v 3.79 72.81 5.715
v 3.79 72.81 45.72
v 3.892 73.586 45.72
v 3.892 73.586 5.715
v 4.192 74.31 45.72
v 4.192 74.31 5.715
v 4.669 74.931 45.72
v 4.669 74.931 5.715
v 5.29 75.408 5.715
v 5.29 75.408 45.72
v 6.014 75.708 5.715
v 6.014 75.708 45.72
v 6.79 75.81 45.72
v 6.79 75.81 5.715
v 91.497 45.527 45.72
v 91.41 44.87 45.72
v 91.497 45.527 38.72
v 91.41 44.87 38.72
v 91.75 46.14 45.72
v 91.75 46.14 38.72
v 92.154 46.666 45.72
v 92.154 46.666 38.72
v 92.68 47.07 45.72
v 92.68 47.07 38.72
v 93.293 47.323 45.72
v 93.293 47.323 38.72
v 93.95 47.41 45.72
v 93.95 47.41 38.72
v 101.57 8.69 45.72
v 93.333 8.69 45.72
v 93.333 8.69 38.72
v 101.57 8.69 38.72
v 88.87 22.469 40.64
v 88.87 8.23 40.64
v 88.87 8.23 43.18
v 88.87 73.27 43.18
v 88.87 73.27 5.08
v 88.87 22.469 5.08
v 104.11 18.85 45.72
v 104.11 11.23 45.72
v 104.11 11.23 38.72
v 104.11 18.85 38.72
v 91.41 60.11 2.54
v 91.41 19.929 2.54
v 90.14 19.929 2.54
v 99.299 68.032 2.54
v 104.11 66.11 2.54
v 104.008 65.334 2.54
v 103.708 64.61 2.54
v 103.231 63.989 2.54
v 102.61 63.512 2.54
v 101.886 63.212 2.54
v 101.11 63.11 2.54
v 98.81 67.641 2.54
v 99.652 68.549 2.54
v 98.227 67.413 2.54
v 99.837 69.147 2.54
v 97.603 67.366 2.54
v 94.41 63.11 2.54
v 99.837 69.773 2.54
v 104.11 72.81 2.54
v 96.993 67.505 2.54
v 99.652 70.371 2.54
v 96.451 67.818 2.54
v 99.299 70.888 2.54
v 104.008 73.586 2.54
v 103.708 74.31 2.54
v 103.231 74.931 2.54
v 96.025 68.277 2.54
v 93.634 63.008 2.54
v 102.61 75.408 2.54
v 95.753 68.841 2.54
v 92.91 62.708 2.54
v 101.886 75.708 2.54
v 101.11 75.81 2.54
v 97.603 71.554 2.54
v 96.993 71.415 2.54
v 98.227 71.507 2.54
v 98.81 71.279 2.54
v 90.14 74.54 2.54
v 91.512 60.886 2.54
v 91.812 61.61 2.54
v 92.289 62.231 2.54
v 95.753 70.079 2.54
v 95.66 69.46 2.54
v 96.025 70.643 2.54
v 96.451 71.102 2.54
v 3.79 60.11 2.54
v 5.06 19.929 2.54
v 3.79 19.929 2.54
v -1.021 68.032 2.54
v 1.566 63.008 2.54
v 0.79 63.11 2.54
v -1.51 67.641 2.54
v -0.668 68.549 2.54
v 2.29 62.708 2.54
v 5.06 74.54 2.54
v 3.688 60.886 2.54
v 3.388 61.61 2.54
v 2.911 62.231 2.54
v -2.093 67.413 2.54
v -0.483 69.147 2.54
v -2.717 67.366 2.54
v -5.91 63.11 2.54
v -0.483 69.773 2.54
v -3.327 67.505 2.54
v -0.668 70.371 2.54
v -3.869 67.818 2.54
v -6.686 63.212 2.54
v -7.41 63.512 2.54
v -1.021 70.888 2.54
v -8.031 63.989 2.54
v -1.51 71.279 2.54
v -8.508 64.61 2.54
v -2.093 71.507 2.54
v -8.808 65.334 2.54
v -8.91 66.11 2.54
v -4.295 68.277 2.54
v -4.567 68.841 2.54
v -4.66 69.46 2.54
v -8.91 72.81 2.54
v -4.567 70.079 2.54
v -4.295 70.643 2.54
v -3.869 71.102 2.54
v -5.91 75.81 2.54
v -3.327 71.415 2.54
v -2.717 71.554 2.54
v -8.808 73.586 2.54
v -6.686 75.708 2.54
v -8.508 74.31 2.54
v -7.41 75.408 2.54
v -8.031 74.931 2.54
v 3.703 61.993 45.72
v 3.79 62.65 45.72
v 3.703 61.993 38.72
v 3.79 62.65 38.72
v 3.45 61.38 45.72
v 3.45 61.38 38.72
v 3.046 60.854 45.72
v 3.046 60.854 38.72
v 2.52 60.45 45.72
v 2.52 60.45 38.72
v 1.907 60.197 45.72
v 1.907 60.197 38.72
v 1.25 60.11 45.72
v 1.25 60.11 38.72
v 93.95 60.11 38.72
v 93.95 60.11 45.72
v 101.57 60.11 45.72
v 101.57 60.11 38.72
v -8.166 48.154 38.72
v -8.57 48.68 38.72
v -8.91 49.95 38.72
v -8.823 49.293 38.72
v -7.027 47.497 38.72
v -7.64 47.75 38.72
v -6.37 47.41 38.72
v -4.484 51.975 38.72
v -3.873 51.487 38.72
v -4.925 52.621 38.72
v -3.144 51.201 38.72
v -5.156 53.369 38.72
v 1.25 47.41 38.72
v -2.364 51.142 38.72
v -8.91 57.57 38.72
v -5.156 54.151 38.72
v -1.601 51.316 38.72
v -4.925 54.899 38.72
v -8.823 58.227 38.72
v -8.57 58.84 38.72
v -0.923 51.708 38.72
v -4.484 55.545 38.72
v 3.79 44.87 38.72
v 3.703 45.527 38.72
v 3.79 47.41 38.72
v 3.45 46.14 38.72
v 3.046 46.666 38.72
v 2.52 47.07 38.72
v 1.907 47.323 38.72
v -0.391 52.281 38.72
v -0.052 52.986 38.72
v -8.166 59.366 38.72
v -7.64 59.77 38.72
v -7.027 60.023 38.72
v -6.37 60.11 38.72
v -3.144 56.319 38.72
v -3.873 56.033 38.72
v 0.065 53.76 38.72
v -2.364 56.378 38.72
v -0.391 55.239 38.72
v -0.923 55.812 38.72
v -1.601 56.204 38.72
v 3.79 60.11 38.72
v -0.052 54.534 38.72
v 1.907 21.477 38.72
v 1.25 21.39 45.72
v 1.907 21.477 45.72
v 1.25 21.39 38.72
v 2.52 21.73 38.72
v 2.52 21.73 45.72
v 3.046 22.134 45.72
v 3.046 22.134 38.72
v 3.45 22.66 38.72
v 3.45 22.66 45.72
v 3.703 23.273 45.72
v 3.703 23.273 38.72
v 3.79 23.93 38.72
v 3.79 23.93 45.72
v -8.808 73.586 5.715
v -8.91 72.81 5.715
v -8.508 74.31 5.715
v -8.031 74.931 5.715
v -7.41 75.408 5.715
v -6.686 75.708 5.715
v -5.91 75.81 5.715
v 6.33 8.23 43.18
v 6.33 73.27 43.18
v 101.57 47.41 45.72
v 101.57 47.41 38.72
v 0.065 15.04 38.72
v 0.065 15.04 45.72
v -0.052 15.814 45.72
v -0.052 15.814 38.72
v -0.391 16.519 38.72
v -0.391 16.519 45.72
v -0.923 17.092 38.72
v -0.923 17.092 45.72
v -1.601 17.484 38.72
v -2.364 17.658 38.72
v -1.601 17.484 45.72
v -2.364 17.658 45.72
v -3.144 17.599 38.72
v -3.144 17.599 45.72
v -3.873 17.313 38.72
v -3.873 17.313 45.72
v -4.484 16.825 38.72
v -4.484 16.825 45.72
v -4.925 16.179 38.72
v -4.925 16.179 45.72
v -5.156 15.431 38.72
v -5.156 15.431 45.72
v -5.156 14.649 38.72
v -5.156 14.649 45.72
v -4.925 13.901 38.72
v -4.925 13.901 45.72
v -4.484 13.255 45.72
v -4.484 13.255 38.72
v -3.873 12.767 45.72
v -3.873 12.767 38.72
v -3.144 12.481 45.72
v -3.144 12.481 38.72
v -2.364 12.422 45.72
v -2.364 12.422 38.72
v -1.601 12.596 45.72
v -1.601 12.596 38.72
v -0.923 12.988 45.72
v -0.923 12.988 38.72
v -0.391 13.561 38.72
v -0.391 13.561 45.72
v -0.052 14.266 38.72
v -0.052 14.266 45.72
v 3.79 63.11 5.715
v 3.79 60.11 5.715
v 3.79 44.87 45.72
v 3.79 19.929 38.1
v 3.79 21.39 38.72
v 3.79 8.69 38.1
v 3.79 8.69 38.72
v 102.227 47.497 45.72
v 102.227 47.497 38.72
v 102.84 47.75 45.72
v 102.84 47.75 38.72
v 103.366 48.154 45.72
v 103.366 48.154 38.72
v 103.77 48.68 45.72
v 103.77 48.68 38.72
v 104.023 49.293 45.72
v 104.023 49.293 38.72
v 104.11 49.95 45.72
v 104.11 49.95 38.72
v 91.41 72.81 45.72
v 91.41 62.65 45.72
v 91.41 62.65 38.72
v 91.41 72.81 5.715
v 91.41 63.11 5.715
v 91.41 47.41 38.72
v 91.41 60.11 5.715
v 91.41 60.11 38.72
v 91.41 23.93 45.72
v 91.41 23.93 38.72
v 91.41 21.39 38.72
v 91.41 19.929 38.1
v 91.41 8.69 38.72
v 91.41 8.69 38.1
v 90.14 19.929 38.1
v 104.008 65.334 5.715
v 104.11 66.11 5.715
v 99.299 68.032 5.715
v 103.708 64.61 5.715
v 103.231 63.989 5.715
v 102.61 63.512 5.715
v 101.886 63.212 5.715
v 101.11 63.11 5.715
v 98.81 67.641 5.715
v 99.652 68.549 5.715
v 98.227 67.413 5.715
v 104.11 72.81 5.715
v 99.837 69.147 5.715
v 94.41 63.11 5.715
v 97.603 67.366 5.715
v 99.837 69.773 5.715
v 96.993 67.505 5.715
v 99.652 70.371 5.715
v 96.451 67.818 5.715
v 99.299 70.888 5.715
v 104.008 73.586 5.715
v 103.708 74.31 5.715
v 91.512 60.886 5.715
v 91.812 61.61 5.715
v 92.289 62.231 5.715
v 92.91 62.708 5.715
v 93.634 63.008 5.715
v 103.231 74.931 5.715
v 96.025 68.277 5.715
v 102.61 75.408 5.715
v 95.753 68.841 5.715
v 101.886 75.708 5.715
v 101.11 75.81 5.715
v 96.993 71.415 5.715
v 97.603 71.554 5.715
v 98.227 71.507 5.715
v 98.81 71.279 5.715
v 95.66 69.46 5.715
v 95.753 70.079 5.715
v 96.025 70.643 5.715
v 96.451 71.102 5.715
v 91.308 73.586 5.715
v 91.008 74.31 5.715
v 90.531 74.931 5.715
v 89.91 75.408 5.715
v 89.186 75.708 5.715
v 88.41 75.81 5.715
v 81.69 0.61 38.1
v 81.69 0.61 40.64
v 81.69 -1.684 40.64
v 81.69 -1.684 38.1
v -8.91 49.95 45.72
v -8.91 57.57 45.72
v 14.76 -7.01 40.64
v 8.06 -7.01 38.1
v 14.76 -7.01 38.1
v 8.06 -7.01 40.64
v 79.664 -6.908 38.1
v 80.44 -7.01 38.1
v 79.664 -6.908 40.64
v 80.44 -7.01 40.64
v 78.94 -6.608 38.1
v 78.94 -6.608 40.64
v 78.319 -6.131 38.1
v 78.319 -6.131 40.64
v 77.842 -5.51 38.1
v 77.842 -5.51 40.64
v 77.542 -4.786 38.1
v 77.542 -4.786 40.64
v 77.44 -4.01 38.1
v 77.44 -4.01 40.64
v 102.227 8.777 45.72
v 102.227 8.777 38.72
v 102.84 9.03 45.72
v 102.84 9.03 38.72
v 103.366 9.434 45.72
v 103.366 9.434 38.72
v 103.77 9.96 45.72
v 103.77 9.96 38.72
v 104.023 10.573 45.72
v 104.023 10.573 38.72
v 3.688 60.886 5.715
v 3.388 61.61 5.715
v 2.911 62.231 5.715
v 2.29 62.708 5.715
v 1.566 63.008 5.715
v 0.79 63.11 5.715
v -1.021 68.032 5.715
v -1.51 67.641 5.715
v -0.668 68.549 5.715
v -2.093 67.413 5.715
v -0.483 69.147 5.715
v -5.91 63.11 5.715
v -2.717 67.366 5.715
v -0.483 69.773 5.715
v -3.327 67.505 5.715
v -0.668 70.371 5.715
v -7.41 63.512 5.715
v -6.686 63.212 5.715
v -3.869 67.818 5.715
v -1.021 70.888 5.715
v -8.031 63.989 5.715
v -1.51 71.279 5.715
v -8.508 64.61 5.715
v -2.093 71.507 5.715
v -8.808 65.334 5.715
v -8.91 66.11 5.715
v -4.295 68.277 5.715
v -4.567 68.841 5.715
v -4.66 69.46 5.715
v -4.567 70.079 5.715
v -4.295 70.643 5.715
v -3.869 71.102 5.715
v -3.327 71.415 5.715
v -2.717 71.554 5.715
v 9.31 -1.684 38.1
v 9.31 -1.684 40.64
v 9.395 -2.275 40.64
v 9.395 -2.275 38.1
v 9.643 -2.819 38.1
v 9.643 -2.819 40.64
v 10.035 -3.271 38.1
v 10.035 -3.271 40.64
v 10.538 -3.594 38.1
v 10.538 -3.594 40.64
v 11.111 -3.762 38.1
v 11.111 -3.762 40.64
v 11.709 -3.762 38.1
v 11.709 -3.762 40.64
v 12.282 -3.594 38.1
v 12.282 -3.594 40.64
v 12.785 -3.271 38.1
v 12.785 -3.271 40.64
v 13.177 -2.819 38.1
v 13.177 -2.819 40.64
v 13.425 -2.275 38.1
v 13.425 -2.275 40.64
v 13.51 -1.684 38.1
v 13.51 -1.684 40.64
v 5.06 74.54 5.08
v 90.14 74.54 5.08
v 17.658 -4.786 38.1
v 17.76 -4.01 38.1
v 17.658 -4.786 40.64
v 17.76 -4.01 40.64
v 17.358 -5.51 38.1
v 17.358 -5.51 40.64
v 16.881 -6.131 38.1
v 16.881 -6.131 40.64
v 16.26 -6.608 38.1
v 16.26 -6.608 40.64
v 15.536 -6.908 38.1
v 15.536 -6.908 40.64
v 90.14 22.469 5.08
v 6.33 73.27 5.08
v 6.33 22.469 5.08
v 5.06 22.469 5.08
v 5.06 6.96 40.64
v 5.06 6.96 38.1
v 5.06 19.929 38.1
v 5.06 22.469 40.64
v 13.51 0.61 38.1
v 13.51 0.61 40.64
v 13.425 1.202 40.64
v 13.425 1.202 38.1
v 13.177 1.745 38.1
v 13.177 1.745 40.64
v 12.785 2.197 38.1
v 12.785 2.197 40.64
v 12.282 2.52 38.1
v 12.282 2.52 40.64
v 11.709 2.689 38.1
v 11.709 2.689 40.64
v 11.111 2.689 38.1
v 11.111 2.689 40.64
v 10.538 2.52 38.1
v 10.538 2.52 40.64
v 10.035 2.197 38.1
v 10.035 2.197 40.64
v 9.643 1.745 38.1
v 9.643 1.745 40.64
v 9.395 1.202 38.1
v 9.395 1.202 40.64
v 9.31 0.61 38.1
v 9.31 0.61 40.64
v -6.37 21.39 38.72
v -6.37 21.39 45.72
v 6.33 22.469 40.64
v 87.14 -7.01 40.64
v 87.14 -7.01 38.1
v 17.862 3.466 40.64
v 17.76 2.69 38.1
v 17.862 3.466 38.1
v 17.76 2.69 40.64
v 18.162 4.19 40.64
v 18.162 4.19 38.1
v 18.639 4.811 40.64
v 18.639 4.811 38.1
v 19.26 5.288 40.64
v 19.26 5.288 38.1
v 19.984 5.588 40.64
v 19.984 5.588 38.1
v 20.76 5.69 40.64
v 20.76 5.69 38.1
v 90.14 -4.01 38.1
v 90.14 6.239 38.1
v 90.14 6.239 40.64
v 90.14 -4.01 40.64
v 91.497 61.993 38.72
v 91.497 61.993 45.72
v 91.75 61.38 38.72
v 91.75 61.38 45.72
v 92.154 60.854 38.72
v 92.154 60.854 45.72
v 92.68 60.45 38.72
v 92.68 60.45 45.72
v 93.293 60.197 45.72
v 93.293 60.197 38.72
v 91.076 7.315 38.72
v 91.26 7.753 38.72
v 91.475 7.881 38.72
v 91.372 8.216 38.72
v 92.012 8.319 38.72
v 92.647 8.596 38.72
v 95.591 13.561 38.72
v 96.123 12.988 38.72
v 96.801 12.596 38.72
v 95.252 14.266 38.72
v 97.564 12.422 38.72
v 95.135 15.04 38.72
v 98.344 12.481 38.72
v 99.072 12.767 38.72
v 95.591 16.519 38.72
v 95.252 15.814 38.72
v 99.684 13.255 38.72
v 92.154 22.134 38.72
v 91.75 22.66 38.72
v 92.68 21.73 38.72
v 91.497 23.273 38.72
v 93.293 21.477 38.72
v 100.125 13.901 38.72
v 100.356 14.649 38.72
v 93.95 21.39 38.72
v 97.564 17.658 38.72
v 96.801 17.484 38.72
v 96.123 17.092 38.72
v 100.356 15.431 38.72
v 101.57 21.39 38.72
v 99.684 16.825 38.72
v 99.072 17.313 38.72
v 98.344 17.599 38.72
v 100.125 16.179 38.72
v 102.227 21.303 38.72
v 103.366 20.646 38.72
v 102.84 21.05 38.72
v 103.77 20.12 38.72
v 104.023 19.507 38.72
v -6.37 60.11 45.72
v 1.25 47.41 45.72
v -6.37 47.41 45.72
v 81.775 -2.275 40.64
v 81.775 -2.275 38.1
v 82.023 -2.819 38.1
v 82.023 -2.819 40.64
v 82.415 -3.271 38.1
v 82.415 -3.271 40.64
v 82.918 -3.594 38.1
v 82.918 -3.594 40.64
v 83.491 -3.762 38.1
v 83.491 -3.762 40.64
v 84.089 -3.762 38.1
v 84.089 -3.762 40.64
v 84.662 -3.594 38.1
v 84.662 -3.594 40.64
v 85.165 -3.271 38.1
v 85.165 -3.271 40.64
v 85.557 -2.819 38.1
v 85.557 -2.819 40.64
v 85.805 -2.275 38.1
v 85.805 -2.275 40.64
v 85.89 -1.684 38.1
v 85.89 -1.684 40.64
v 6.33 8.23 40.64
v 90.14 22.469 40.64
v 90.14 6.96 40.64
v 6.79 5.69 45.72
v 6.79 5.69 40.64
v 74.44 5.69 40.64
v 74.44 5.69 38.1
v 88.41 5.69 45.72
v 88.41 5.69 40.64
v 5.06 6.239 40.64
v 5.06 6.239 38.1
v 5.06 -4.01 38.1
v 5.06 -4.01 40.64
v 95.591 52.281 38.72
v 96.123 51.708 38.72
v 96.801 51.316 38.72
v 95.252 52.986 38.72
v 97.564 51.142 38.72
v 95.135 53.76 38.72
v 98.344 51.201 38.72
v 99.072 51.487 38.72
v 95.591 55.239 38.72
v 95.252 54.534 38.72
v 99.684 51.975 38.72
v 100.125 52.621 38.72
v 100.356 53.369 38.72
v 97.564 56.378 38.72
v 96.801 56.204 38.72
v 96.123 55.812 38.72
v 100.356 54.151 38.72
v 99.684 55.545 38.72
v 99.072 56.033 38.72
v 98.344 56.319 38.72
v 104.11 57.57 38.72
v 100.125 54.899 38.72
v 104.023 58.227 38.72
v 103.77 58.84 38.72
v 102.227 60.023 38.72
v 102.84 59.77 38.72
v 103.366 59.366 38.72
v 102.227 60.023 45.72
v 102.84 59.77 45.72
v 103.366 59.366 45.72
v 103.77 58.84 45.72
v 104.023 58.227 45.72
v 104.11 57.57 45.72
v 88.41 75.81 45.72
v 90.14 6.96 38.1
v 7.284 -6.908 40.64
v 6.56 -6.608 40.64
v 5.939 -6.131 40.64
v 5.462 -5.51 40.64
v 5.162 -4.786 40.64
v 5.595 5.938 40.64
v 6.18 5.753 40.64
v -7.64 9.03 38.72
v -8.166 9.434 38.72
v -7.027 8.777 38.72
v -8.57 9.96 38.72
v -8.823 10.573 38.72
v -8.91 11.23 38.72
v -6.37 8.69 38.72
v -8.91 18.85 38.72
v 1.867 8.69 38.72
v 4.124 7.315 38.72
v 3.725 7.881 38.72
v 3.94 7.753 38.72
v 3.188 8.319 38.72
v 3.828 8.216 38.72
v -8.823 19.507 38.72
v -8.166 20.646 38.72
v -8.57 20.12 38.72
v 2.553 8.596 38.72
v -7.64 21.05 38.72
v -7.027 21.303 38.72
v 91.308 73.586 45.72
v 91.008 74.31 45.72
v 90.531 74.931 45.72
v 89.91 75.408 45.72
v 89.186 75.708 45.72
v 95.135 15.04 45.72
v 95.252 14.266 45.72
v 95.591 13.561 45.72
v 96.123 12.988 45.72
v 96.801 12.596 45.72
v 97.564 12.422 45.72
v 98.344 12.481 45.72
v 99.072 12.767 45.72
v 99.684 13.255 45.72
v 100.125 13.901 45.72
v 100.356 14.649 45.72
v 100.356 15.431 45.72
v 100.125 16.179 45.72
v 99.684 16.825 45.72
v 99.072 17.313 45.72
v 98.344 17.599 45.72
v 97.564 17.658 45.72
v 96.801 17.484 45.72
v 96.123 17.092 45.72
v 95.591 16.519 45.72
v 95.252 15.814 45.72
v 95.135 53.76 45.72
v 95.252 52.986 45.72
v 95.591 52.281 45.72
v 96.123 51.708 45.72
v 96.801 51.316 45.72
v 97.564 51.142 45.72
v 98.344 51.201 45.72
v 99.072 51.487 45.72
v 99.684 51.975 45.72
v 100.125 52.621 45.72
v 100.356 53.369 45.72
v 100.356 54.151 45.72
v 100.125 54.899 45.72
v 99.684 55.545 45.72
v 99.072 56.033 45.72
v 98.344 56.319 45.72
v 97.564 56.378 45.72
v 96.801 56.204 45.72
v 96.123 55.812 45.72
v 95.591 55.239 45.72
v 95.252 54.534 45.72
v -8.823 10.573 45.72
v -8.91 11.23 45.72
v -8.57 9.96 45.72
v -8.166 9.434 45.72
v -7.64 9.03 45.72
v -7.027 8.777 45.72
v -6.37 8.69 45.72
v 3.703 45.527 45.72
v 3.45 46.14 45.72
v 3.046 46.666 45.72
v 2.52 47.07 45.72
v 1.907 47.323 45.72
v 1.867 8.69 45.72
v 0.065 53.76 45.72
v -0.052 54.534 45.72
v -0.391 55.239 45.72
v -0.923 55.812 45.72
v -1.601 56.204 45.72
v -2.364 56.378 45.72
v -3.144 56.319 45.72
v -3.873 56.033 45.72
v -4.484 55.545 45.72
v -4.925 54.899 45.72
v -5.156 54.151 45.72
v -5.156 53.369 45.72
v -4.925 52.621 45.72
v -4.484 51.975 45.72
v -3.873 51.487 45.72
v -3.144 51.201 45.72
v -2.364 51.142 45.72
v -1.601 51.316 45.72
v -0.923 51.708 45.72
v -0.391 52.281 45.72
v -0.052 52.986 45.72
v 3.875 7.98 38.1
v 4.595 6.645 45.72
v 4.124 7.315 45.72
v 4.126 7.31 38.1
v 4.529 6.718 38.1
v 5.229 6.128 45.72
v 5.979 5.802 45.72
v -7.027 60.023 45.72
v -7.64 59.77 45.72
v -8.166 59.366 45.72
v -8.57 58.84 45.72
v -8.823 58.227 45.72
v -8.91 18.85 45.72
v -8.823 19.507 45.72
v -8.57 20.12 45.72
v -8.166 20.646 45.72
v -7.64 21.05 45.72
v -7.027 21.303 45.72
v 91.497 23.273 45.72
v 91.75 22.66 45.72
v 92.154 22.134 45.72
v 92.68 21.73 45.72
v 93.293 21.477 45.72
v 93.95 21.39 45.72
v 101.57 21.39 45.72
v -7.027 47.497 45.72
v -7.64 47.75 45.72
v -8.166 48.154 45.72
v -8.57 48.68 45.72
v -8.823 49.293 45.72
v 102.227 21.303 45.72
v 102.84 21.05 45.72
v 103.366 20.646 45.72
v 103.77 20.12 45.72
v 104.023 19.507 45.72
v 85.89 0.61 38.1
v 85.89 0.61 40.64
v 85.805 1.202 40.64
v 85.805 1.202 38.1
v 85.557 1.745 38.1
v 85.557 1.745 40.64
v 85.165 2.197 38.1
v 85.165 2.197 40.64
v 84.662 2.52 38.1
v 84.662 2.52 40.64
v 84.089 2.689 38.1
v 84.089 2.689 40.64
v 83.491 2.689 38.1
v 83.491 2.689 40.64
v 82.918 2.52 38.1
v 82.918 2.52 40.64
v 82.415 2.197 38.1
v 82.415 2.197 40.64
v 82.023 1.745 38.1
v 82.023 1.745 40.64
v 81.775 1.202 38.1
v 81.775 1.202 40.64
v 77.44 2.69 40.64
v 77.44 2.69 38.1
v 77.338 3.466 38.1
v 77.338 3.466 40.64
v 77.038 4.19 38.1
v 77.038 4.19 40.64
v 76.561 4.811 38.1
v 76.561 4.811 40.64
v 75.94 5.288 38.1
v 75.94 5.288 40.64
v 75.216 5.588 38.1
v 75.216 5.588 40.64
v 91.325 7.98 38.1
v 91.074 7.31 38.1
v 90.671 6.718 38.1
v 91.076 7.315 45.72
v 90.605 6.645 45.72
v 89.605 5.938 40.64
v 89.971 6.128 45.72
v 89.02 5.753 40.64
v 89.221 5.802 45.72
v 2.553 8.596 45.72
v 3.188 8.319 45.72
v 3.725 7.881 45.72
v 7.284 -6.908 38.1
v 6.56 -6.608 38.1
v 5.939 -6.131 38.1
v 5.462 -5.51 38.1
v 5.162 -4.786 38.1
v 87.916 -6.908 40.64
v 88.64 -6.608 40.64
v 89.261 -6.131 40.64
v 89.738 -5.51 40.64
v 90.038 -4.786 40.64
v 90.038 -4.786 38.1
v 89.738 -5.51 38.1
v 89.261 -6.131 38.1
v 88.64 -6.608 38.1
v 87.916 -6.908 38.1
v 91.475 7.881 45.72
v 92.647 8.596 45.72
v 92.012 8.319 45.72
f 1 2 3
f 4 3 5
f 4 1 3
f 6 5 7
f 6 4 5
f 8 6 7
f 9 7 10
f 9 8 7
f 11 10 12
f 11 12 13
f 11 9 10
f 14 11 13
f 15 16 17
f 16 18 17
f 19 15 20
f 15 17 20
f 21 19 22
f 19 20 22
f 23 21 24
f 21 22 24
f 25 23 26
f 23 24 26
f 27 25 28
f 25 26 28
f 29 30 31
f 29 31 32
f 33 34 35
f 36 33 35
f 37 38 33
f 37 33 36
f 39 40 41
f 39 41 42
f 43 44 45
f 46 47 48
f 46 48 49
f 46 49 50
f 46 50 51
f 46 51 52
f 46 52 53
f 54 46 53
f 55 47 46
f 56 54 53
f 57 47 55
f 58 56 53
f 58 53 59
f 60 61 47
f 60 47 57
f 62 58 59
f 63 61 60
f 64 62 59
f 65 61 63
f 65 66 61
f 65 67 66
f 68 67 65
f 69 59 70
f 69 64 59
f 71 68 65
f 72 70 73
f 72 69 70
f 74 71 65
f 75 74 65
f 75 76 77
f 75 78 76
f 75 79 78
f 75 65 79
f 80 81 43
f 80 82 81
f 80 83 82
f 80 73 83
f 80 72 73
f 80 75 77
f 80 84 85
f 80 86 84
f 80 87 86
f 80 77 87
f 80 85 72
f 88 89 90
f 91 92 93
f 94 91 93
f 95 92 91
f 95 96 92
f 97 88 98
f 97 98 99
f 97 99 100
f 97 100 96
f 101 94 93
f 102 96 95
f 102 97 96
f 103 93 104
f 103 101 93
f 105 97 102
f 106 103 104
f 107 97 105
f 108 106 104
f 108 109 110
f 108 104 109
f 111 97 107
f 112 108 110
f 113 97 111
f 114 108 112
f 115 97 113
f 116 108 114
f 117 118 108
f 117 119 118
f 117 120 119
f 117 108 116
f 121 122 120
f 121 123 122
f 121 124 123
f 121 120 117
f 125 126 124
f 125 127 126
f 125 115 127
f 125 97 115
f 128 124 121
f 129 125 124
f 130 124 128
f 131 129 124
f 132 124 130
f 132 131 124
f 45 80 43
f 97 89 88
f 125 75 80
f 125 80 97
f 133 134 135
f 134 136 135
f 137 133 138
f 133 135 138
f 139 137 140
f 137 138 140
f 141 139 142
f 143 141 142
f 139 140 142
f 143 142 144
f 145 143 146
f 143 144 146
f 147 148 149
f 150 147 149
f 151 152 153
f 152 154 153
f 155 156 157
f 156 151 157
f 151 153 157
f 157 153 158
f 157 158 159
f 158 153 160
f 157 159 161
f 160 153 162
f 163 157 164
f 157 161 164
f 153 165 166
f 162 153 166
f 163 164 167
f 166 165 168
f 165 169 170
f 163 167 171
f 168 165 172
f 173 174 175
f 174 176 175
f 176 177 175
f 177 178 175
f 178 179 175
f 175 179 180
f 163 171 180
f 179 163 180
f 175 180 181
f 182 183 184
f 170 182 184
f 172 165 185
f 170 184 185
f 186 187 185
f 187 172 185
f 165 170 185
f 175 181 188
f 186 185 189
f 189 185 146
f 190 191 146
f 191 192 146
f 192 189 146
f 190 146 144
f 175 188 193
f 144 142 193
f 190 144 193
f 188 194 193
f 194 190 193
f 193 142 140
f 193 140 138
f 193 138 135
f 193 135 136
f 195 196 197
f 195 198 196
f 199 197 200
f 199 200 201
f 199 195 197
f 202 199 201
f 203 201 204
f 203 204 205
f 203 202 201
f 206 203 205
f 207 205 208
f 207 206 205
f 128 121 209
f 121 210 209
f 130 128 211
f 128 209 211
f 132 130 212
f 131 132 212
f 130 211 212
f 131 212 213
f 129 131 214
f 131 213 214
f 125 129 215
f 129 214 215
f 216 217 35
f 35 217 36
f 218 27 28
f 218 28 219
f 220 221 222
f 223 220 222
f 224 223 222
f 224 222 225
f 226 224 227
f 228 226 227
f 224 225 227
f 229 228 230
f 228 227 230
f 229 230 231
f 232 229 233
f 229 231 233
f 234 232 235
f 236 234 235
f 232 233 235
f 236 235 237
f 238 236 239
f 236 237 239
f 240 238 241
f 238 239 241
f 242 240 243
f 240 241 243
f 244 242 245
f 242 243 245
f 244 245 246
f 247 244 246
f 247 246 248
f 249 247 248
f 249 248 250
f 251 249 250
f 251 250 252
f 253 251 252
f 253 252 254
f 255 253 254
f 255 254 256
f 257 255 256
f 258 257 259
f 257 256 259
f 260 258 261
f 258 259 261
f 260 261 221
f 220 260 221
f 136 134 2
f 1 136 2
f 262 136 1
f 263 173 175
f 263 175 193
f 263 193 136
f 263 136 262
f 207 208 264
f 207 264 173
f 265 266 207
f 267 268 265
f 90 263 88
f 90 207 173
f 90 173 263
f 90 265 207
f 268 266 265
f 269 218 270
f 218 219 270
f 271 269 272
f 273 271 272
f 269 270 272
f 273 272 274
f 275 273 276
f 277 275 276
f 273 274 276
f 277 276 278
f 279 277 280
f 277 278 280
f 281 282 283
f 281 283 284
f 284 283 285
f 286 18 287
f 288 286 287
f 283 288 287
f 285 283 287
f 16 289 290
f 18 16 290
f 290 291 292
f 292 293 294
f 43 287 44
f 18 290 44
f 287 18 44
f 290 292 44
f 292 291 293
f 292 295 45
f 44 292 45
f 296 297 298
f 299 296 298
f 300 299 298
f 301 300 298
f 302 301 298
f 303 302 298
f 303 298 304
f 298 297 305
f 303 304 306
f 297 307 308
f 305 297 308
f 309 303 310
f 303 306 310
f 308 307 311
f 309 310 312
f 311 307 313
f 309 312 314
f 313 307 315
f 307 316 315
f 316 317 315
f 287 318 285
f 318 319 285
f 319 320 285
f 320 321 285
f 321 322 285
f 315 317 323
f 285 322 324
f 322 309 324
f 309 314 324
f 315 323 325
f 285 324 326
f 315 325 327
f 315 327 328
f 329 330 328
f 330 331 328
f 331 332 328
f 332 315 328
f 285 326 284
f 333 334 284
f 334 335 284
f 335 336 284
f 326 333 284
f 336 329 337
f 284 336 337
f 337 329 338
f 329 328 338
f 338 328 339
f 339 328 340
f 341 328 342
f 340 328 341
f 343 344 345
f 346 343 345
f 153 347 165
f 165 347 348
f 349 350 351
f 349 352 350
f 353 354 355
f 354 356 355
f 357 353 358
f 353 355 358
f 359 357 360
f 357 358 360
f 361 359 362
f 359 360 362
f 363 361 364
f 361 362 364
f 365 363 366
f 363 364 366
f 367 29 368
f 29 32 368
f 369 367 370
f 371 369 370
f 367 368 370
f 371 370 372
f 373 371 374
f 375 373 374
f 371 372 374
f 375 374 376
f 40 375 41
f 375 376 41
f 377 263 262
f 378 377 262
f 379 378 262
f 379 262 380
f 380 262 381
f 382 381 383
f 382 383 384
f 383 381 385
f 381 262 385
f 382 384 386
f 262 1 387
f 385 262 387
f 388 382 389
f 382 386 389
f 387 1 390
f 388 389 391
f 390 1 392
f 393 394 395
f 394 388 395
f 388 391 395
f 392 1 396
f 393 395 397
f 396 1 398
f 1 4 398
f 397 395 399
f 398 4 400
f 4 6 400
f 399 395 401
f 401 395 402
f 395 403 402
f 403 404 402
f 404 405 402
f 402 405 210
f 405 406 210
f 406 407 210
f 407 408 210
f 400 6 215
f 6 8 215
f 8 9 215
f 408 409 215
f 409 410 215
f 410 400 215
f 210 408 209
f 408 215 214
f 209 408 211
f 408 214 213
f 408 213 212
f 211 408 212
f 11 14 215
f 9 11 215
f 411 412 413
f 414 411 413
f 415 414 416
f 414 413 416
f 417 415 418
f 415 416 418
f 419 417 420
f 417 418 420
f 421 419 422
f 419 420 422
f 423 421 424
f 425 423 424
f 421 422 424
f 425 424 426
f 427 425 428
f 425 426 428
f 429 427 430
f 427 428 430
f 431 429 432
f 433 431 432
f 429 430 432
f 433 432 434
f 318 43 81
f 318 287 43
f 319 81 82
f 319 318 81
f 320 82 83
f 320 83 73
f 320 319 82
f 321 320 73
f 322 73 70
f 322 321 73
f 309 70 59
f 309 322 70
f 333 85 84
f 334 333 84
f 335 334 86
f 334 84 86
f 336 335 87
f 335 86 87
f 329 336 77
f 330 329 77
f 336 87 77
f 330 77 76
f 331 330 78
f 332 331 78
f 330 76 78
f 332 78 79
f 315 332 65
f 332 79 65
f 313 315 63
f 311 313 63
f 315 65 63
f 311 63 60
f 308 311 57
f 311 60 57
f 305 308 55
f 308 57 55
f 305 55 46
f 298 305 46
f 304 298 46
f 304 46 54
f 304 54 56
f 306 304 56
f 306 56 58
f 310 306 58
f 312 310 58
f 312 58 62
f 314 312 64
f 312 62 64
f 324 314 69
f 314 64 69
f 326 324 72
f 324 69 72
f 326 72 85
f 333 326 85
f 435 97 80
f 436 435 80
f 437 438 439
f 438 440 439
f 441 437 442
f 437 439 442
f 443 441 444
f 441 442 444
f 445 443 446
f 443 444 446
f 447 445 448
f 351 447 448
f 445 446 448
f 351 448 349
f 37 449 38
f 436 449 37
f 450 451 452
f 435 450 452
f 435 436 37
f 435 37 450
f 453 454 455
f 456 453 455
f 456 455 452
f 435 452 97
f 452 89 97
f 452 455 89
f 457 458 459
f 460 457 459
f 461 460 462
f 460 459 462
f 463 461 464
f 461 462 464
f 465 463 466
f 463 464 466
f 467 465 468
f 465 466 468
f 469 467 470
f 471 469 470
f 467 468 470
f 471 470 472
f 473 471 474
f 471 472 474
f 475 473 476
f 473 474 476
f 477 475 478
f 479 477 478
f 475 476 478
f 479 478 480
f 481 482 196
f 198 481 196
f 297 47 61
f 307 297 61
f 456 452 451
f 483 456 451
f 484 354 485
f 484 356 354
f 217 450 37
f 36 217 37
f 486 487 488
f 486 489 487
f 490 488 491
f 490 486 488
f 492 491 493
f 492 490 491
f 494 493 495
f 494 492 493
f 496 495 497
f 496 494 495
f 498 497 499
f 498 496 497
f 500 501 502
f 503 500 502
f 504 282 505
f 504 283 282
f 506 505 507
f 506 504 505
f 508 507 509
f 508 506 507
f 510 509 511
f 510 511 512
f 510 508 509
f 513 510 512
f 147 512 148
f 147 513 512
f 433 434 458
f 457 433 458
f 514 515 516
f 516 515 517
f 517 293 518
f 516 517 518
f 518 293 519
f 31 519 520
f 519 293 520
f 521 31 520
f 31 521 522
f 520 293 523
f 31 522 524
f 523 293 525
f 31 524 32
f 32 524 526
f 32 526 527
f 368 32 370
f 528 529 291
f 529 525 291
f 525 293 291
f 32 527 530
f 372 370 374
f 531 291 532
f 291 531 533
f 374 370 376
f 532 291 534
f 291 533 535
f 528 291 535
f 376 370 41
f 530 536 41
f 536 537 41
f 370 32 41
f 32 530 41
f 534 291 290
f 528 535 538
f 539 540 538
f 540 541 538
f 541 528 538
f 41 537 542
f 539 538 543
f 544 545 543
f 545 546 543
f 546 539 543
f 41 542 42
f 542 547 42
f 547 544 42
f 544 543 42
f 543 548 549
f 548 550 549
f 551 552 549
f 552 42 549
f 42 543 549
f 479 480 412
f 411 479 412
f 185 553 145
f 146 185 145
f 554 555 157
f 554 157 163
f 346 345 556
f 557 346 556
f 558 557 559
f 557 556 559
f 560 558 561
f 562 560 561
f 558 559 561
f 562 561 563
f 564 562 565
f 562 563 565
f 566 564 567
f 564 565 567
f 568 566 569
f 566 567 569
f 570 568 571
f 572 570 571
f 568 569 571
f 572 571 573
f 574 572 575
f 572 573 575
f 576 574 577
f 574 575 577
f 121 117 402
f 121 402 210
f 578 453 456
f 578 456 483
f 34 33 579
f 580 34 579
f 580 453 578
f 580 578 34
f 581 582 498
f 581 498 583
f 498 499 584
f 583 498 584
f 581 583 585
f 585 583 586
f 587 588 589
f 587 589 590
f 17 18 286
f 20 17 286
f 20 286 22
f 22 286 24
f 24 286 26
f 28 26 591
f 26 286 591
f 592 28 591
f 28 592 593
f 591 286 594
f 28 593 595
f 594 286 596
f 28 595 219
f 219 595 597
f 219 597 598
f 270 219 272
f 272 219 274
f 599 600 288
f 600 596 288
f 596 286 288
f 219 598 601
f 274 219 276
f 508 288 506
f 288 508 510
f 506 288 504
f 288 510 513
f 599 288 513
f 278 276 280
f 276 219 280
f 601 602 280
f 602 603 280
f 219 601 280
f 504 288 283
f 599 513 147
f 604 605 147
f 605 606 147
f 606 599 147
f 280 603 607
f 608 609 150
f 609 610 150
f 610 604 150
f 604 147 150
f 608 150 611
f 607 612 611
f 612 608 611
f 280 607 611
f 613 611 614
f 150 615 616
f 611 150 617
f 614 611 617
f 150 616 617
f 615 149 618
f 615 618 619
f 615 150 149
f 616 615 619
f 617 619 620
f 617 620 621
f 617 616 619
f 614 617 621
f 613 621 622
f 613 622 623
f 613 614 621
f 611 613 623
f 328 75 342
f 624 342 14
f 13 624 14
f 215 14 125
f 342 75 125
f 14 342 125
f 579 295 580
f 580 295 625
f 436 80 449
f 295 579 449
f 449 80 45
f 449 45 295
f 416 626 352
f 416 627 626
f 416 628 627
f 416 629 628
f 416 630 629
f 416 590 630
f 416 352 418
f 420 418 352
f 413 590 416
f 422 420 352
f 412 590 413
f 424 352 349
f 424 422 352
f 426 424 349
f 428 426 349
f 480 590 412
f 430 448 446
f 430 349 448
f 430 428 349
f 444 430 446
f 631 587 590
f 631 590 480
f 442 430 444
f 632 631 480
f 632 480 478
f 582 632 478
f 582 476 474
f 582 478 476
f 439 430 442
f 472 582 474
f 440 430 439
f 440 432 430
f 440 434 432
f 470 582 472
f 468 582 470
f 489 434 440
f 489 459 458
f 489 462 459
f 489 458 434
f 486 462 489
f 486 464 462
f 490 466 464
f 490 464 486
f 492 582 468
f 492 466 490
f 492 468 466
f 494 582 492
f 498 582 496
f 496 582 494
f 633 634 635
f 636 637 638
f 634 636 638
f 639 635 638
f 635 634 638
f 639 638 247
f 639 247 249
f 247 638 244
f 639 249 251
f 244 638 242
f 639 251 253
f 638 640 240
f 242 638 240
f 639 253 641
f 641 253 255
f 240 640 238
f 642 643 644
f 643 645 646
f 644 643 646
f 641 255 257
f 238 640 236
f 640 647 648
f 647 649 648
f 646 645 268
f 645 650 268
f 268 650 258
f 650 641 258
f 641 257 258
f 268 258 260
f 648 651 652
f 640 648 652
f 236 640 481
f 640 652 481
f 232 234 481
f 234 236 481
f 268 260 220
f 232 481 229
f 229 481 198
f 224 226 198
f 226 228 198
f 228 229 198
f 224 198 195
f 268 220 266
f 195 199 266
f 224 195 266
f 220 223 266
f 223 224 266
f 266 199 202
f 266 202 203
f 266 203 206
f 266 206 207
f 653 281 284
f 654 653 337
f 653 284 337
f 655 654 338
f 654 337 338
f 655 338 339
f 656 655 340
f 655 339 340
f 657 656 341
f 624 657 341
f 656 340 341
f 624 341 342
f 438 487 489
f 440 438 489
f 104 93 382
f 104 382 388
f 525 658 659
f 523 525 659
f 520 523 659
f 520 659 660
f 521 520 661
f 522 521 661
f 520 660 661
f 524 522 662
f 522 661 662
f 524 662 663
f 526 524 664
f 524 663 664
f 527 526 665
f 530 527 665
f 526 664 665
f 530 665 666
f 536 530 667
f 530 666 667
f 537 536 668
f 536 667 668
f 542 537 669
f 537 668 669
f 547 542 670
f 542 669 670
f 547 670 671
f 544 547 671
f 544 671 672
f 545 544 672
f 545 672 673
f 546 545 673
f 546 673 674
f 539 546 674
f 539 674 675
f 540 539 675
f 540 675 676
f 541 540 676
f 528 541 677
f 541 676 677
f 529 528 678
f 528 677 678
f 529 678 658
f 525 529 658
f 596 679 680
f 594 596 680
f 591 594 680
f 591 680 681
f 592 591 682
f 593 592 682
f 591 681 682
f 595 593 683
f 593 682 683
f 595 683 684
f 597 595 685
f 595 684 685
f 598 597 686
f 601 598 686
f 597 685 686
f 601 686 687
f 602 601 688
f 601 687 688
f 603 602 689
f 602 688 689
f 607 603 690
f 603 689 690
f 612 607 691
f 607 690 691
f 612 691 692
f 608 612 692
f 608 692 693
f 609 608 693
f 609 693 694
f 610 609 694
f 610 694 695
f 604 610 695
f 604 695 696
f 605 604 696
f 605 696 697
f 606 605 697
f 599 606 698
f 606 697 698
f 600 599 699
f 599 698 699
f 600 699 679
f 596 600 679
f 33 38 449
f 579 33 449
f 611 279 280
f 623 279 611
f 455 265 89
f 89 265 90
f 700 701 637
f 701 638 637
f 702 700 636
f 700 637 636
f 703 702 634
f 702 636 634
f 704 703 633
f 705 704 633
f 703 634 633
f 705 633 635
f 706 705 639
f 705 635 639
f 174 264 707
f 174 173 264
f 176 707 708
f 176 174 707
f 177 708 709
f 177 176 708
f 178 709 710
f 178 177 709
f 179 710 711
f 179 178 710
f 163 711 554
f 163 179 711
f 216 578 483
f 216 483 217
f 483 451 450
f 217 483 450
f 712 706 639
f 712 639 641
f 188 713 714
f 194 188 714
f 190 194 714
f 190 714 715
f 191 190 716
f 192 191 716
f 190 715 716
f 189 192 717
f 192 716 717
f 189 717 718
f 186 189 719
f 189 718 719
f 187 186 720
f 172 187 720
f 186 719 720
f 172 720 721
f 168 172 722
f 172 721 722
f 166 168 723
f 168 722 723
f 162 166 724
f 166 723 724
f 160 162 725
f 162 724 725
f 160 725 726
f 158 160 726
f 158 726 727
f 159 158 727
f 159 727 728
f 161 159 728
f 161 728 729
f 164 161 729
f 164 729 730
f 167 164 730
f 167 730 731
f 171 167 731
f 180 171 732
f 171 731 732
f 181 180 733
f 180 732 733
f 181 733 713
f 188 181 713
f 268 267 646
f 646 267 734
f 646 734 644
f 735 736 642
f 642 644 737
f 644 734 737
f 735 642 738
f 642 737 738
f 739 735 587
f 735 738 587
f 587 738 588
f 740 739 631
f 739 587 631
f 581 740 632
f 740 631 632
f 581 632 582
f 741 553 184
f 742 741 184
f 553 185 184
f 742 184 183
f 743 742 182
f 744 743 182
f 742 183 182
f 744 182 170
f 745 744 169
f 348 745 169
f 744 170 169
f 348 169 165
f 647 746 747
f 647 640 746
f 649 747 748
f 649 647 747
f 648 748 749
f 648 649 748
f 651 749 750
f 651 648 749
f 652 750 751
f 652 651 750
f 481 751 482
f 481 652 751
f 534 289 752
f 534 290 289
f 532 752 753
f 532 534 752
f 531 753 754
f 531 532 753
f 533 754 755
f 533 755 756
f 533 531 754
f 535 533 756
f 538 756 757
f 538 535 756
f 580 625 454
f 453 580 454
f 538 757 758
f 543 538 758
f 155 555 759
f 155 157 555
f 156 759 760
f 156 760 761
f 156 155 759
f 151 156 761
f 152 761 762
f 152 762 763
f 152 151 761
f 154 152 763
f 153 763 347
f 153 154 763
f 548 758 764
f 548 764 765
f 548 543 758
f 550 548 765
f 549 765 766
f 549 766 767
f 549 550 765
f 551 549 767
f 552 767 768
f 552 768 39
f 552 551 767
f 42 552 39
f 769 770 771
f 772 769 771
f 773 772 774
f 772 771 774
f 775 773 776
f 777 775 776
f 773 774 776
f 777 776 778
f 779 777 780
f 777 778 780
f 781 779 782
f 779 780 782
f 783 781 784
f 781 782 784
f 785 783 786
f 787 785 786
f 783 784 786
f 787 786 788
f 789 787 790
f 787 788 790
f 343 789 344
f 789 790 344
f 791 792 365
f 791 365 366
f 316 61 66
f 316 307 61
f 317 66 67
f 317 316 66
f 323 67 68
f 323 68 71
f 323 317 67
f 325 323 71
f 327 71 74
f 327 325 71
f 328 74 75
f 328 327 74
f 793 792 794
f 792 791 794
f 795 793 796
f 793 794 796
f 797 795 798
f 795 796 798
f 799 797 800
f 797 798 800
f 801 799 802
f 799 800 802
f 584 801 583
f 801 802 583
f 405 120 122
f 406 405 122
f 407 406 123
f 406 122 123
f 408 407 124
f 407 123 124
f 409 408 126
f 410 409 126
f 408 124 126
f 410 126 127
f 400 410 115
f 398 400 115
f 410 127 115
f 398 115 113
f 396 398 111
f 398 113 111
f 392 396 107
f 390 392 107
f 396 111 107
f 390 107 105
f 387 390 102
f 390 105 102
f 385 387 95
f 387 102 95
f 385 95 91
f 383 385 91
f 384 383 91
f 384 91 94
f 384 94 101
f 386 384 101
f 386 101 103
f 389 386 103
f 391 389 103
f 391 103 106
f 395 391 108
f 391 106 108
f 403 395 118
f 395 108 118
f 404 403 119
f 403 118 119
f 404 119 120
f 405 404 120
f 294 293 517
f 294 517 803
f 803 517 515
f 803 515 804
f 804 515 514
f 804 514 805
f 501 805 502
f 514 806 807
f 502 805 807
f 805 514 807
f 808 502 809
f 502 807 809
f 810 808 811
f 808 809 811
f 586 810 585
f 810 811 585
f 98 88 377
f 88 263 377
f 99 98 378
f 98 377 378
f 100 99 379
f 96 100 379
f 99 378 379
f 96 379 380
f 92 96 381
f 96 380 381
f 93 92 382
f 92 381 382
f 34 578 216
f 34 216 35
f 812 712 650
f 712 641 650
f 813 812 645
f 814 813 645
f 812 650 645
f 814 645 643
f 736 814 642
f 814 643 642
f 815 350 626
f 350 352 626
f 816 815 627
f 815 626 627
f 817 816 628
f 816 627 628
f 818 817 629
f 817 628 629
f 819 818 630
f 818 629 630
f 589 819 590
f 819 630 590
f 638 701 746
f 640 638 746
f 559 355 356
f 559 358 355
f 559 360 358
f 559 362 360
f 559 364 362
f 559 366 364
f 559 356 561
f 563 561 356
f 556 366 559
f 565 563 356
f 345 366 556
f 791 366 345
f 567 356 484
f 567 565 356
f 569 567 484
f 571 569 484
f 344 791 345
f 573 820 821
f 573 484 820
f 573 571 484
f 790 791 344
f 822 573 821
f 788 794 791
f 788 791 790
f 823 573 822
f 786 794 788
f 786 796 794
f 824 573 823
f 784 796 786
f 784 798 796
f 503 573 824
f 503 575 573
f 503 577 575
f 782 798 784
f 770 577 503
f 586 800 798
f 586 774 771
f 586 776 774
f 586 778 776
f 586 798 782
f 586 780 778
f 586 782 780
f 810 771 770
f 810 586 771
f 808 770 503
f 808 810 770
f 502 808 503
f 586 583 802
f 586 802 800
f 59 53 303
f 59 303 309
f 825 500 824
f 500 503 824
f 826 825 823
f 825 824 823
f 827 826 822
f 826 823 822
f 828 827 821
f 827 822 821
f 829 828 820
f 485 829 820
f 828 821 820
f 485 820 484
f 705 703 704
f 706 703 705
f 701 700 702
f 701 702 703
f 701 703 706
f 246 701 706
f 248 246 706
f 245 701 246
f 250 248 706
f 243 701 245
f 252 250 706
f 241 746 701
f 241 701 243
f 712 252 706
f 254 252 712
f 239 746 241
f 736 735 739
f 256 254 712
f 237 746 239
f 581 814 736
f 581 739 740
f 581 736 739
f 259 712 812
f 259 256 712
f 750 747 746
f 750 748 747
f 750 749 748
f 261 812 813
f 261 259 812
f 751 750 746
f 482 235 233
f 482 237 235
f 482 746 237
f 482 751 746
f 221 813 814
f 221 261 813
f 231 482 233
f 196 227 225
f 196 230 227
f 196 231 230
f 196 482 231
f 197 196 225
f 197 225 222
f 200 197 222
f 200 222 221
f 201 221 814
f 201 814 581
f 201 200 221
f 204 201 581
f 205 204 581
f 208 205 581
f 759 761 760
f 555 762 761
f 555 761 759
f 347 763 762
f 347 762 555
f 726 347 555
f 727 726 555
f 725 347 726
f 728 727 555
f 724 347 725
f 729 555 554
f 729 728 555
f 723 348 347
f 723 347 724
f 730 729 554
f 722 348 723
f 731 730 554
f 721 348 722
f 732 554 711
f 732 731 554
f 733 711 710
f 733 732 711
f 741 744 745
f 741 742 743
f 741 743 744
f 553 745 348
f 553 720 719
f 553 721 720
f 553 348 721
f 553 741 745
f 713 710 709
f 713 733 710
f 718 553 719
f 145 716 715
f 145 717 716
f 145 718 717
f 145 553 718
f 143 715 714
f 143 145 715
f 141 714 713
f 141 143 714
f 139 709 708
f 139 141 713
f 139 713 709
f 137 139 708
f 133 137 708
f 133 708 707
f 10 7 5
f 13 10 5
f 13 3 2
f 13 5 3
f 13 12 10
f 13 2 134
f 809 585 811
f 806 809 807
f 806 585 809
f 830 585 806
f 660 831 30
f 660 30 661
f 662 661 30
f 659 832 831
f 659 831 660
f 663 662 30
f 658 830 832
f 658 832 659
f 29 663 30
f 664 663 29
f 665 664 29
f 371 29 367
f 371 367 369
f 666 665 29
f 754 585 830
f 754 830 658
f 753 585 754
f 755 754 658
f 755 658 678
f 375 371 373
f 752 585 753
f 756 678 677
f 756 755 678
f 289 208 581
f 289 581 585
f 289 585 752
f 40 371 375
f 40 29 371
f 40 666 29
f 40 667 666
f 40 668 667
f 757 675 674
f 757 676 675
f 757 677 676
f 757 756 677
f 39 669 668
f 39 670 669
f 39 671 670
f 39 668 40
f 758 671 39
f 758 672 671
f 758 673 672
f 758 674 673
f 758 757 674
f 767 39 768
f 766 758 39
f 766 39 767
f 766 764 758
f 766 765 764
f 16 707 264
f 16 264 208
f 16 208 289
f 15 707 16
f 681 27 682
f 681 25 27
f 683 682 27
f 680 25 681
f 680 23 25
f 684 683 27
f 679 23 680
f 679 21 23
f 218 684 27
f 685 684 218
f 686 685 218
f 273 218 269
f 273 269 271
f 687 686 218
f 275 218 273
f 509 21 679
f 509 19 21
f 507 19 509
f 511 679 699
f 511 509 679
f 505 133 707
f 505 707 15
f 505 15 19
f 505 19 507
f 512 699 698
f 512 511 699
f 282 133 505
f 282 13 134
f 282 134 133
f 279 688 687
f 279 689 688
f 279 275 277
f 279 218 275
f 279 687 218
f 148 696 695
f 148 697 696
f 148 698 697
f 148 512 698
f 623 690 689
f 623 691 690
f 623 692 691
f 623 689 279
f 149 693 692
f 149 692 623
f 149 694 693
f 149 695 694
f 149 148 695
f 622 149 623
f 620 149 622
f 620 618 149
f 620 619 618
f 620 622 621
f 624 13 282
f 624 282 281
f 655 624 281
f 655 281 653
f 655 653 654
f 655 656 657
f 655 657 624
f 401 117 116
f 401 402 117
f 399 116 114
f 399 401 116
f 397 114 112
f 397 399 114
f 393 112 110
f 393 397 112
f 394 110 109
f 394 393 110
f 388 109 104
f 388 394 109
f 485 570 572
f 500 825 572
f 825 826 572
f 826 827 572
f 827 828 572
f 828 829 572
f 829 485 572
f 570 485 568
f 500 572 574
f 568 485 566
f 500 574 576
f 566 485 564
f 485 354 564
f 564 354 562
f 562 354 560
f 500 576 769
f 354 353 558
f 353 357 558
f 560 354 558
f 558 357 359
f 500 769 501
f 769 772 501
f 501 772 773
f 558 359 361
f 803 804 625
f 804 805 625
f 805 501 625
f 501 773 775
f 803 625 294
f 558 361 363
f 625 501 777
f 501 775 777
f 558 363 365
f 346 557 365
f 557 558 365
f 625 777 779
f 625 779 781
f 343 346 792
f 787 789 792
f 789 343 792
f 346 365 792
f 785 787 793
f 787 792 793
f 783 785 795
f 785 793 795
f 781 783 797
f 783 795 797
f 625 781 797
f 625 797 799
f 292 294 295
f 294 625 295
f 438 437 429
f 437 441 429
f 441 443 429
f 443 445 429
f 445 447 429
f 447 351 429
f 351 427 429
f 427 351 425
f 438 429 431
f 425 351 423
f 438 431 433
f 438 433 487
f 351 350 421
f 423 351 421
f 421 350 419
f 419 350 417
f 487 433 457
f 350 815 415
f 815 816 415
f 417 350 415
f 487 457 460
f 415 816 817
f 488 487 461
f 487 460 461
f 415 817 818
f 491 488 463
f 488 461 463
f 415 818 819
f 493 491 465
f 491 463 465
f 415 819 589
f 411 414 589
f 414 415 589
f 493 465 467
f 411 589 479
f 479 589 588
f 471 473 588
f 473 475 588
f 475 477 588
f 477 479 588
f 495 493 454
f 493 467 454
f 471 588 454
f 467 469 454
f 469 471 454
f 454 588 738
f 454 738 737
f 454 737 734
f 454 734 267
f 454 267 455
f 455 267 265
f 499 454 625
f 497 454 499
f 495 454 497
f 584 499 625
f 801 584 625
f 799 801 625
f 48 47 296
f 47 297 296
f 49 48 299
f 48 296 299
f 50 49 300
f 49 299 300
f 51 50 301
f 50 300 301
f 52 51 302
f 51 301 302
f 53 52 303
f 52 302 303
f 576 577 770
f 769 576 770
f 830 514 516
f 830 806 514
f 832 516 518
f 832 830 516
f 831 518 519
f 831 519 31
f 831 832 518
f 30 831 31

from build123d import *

# Parameters (mm, degrees)
SKETCH1_W           = 82.539998569
SKETCH1_H           = 65.04
BOSS_EXTRUDE1_DEPTH = 43.18
SHELL1_T            = 2.54
CUT_EXTRUDE2_DEPTH  = 124.028758627
SKETCH7_W           = 87.619998569
SKETCH7_H           = 43.18
BOSS_EXTRUDE2_DEPTH = 2.54
CUT_EXTRUDE3_DEPTH  = 2.54
CUT_EXTRUDE4_DEPTH  = 2.54
SKETCH10_W          = 1.27
SKETCH10_H          = 35.56
CUT_EXTRUDE5_DEPTH  = 2.54
SKETCH11_W          = 12.7
SKETCH11_H          = 2.54
BOSS_EXTRUDE3_DEPTH = 12.7
CUT_EXTRUDE7_DEPTH  = 125.717897357
SKETCH13_W          = 12.7
SKETCH13_H          = 12.7
SKETCH13_R          = 2.1
BOSS_EXTRUDE4_DEPTH = 3.175
FILLET2_R           = 3
SKETCH14_W          = 12.7
SKETCH14_H          = 12.7
SKETCH14_R          = 2.625
BOSS_EXTRUDE5_DEPTH = 7
FILLET3_R           = 2.54


with BuildPart() as part:
    # Sketch1 → Boss-Extrude1 (new body)
    with BuildSketch(Plane.XY):
        with Locations((47.599999189, 40.75)):
            Rectangle(SKETCH1_W, SKETCH1_H)
    extrude(amount=BOSS_EXTRUDE1_DEPTH)

    # Shell1
    shell1_openings = [part.faces().sort_by_distance(p)[0] for p in [
        (47.599999189, 73.27, 21.59),
        (47.599999189, 40.75, 0),
    ]]
    offset(amount=SHELL1_T, openings=shell1_openings, kind=Kind.INTERSECTION)

    # Sketch6 → Cut-Extrude2 (cut, through all)
    with BuildSketch(Plane.ZY.offset(-3.789999905)):
        Polygon((2.54, 59.03), (2.54, 73.27), (0, 73.27), (0, 59.03), (0, 3.15), (38.1, 3.15), (38.1, 19.92924), (2.54, 19.92924), align=None)
    extrude(amount=-CUT_EXTRUDE2_DEPTH, mode=Mode.SUBTRACT)

    # Sketch7 → Boss-Extrude2 (add)
    with BuildSketch(Plane(origin=(0, 73.27, 0), x_dir=(1, 0, 0), z_dir=(0, 1, 0))):
        with Locations((47.59999919, -24.13)):
            Rectangle(SKETCH7_W, SKETCH7_H)
    extrude(amount=BOSS_EXTRUDE2_DEPTH)

    # Sketch8 → Cut-Extrude3 (cut)
    with BuildSketch(Plane(origin=(0, 0, 2.54), x_dir=(-1, 0, 0), z_dir=(0, 0, -1))):
        Polygon((-65.405564728, 73.27), (-65.405564728, 74.54), (-90.139998474, 74.54), (-90.139998474, 19.92924), (-88.869998474, 19.92924), (-88.869998474, 73.27), align=None)
        Polygon((-5.059999905, 74.54), (-65.405564728, 74.54), (-65.405564728, 73.27), (-6.329999905, 73.27), (-6.329999905, 19.92924), (-5.059999905, 19.92924), align=None)
    extrude(amount=-CUT_EXTRUDE3_DEPTH, mode=Mode.SUBTRACT)

    # Sketch9 → Cut-Extrude4 (cut)
    with BuildSketch(Plane(origin=(0, 0, 38.1), x_dir=(-1, 0, 0), z_dir=(0, 0, -1))):
        Polygon((-90.139998474, 19.92924), (-90.139998474, 6.96), (-5.059999905, 6.96), (-5.059999905, 19.92924), (-6.329999905, 19.92924), (-6.329999905, 8.23), (-88.869998474, 8.23), (-88.869998474, 19.92924), align=None)
    extrude(amount=-CUT_EXTRUDE4_DEPTH, mode=Mode.SUBTRACT)

    # Sketch10 → Cut-Extrude5 (cut)
    with BuildSketch(Plane.XZ.offset(-19.92924)):
        with Locations((5.694999905, 22.86)):
            Rectangle(SKETCH10_W, SKETCH10_H)
        with Locations((89.504998474, 22.86)):
            Rectangle(SKETCH10_W, SKETCH10_H)
    extrude(amount=-CUT_EXTRUDE5_DEPTH, mode=Mode.SUBTRACT)

    # Sketch11 → Boss-Extrude3 (add)
    with BuildSketch(Plane.XZ.offset(-5.69)):
        with Locations((11.409999905, 39.37)):
            Rectangle(SKETCH11_W, SKETCH11_H)
        with Locations((83.789998474, 39.37)):
            Rectangle(SKETCH11_W, SKETCH11_H)
    extrude(amount=BOSS_EXTRUDE3_DEPTH)

    # Sketch12 → Cut-Extrude7 (cut, through all)
    with BuildSketch(Plane.XY.offset(40.64)):
        with BuildLine():
            Line((9.309999905, 0.61), (9.309999905, -1.683510845))
            ThreePointArc((9.309999905, -1.683510845), (11.409999905, -3.783510845), (13.509999905, -1.683510845))
            Line((13.509999905, -1.683510845), (13.509999905, 0.61))
            ThreePointArc((13.509999905, 0.61), (11.409999905, 2.71), (9.309999905, 0.61))
        make_face()
        with BuildLine():
            Line((81.689998474, 0.61), (81.689998474, -1.683510845))
            ThreePointArc((81.689998474, -1.683510845), (83.789998474, -3.783510845), (85.889998474, -1.683510845))
            Line((85.889998474, -1.683510845), (85.889998474, 0.61))
            ThreePointArc((85.889998474, 0.61), (83.789998474, 2.71), (81.689998474, 0.61))
        make_face()
    extrude(amount=-CUT_EXTRUDE7_DEPTH, mode=Mode.SUBTRACT)

    # Sketch13 → Boss-Extrude4 (add)
    # profile 1 of 2: a face of its own
    with BuildSketch(Plane(origin=(0, 0, 2.54), x_dir=(-1, 0, 0), z_dir=(0, 0, -1))):
        with Locations((-97.759998474, 69.46)):
            Rectangle(SKETCH13_W, SKETCH13_H)
        with Locations((-97.759998474, 69.46)):
            Circle(SKETCH13_R, mode=Mode.SUBTRACT)
    # profile 2 of 2: a face of its own
    with BuildSketch(Plane(origin=(0, 0, 2.54), x_dir=(-1, 0, 0), z_dir=(0, 0, -1))):
        with Locations((2.560000095, 69.46)):
            Rectangle(SKETCH13_W, SKETCH13_H)
        with Locations((2.560000095, 69.46)):
            Circle(SKETCH13_R, mode=Mode.SUBTRACT)
    extrude(amount=-BOSS_EXTRUDE4_DEPTH)

    # Fillet2
    fillet2_edges = [part.edges().sort_by_distance(p)[0] for p in [
        (77.439998474, 5.69, 39.37),
        (77.439998474, -7.01, 39.37),
        (90.139998474, -7.01, 39.37),
        (17.759999905, -7.01, 39.37),
        (5.059999905, -7.01, 39.37),
        (17.759999905, 5.69, 39.37),
        (3.789999905, 63.11, 4.1275),
        (-8.910000095, 63.11, 4.1275),
        (-8.910000095, 75.81, 4.1275),
        (91.409998474, 63.11, 4.1275),
        (104.109998474, 63.11, 4.1275),
        (104.109998474, 75.81, 4.1275),
        (91.409998474, 75.81, 25.7175),
        (3.789999905, 75.81, 25.7175),
        (3.789999905, 5.69, 41.91),
        (91.409998474, 5.69, 41.91),
    ]]
    fillet(fillet2_edges, radius=FILLET2_R)

    # Sketch14 → Boss-Extrude5 (add)
    # profile 1 of 4: a face of its own
    with BuildSketch(Plane.XY.offset(45.72)):
        with Locations((-2.560000095, 53.76)):
            Rectangle(SKETCH14_W, SKETCH14_H)
        with Locations((-2.560000095, 53.76)):
            Circle(SKETCH14_R, mode=Mode.SUBTRACT)
    # profile 2 of 4: a face of its own
    with BuildSketch(Plane.XY.offset(45.72)):
        with Locations((-2.560000095, 15.04)):
            Rectangle(SKETCH14_W, SKETCH14_H)
        with Locations((-2.560000095, 15.04)):
            Circle(SKETCH14_R, mode=Mode.SUBTRACT)
    # profile 3 of 4: a face of its own
    with BuildSketch(Plane.XY.offset(45.72)):
        with Locations((97.759998474, 15.04)):
            Rectangle(SKETCH14_W, SKETCH14_H)
        with Locations(Location((97.759998474, 15.04, 0), (0, 0, 180))):
            Circle(SKETCH14_R, mode=Mode.SUBTRACT)
    # profile 4 of 4: a face of its own
    with BuildSketch(Plane.XY.offset(45.72)):
        with Locations((97.759998474, 53.76)):
            Rectangle(SKETCH14_W, SKETCH14_H)
        with Locations(Location((97.759998474, 53.76, 0), (0, 0, 180))):
            Circle(SKETCH14_R, mode=Mode.SUBTRACT)
    extrude(amount=-BOSS_EXTRUDE5_DEPTH)

    # Fillet3
    fillet3_edges = [part.edges().sort_by_distance(p)[0] for p in [
        (91.409998474, 8.69, 42.22),
        (3.789999905, 60.11, 42.22),
        (3.789999905, 47.41, 42.22),
        (-8.910000095, 47.41, 42.22),
        (-8.910000095, 60.11, 42.22),
        (3.789999905, 21.39, 42.22),
        (3.789999905, 8.69, 42.22),
        (-8.910000095, 8.69, 42.22),
        (-8.910000095, 21.39, 42.22),
        (91.409998474, 21.39, 42.22),
        (104.109998474, 21.39, 42.22),
        (104.109998474, 8.69, 42.22),
        (91.409998474, 47.41, 42.22),
        (91.409998474, 60.11, 42.22),
        (104.109998474, 60.11, 42.22),
        (104.109998474, 47.41, 42.22),
    ]]
    fillet(fillet3_edges, radius=FILLET3_R)


solid = part.part
